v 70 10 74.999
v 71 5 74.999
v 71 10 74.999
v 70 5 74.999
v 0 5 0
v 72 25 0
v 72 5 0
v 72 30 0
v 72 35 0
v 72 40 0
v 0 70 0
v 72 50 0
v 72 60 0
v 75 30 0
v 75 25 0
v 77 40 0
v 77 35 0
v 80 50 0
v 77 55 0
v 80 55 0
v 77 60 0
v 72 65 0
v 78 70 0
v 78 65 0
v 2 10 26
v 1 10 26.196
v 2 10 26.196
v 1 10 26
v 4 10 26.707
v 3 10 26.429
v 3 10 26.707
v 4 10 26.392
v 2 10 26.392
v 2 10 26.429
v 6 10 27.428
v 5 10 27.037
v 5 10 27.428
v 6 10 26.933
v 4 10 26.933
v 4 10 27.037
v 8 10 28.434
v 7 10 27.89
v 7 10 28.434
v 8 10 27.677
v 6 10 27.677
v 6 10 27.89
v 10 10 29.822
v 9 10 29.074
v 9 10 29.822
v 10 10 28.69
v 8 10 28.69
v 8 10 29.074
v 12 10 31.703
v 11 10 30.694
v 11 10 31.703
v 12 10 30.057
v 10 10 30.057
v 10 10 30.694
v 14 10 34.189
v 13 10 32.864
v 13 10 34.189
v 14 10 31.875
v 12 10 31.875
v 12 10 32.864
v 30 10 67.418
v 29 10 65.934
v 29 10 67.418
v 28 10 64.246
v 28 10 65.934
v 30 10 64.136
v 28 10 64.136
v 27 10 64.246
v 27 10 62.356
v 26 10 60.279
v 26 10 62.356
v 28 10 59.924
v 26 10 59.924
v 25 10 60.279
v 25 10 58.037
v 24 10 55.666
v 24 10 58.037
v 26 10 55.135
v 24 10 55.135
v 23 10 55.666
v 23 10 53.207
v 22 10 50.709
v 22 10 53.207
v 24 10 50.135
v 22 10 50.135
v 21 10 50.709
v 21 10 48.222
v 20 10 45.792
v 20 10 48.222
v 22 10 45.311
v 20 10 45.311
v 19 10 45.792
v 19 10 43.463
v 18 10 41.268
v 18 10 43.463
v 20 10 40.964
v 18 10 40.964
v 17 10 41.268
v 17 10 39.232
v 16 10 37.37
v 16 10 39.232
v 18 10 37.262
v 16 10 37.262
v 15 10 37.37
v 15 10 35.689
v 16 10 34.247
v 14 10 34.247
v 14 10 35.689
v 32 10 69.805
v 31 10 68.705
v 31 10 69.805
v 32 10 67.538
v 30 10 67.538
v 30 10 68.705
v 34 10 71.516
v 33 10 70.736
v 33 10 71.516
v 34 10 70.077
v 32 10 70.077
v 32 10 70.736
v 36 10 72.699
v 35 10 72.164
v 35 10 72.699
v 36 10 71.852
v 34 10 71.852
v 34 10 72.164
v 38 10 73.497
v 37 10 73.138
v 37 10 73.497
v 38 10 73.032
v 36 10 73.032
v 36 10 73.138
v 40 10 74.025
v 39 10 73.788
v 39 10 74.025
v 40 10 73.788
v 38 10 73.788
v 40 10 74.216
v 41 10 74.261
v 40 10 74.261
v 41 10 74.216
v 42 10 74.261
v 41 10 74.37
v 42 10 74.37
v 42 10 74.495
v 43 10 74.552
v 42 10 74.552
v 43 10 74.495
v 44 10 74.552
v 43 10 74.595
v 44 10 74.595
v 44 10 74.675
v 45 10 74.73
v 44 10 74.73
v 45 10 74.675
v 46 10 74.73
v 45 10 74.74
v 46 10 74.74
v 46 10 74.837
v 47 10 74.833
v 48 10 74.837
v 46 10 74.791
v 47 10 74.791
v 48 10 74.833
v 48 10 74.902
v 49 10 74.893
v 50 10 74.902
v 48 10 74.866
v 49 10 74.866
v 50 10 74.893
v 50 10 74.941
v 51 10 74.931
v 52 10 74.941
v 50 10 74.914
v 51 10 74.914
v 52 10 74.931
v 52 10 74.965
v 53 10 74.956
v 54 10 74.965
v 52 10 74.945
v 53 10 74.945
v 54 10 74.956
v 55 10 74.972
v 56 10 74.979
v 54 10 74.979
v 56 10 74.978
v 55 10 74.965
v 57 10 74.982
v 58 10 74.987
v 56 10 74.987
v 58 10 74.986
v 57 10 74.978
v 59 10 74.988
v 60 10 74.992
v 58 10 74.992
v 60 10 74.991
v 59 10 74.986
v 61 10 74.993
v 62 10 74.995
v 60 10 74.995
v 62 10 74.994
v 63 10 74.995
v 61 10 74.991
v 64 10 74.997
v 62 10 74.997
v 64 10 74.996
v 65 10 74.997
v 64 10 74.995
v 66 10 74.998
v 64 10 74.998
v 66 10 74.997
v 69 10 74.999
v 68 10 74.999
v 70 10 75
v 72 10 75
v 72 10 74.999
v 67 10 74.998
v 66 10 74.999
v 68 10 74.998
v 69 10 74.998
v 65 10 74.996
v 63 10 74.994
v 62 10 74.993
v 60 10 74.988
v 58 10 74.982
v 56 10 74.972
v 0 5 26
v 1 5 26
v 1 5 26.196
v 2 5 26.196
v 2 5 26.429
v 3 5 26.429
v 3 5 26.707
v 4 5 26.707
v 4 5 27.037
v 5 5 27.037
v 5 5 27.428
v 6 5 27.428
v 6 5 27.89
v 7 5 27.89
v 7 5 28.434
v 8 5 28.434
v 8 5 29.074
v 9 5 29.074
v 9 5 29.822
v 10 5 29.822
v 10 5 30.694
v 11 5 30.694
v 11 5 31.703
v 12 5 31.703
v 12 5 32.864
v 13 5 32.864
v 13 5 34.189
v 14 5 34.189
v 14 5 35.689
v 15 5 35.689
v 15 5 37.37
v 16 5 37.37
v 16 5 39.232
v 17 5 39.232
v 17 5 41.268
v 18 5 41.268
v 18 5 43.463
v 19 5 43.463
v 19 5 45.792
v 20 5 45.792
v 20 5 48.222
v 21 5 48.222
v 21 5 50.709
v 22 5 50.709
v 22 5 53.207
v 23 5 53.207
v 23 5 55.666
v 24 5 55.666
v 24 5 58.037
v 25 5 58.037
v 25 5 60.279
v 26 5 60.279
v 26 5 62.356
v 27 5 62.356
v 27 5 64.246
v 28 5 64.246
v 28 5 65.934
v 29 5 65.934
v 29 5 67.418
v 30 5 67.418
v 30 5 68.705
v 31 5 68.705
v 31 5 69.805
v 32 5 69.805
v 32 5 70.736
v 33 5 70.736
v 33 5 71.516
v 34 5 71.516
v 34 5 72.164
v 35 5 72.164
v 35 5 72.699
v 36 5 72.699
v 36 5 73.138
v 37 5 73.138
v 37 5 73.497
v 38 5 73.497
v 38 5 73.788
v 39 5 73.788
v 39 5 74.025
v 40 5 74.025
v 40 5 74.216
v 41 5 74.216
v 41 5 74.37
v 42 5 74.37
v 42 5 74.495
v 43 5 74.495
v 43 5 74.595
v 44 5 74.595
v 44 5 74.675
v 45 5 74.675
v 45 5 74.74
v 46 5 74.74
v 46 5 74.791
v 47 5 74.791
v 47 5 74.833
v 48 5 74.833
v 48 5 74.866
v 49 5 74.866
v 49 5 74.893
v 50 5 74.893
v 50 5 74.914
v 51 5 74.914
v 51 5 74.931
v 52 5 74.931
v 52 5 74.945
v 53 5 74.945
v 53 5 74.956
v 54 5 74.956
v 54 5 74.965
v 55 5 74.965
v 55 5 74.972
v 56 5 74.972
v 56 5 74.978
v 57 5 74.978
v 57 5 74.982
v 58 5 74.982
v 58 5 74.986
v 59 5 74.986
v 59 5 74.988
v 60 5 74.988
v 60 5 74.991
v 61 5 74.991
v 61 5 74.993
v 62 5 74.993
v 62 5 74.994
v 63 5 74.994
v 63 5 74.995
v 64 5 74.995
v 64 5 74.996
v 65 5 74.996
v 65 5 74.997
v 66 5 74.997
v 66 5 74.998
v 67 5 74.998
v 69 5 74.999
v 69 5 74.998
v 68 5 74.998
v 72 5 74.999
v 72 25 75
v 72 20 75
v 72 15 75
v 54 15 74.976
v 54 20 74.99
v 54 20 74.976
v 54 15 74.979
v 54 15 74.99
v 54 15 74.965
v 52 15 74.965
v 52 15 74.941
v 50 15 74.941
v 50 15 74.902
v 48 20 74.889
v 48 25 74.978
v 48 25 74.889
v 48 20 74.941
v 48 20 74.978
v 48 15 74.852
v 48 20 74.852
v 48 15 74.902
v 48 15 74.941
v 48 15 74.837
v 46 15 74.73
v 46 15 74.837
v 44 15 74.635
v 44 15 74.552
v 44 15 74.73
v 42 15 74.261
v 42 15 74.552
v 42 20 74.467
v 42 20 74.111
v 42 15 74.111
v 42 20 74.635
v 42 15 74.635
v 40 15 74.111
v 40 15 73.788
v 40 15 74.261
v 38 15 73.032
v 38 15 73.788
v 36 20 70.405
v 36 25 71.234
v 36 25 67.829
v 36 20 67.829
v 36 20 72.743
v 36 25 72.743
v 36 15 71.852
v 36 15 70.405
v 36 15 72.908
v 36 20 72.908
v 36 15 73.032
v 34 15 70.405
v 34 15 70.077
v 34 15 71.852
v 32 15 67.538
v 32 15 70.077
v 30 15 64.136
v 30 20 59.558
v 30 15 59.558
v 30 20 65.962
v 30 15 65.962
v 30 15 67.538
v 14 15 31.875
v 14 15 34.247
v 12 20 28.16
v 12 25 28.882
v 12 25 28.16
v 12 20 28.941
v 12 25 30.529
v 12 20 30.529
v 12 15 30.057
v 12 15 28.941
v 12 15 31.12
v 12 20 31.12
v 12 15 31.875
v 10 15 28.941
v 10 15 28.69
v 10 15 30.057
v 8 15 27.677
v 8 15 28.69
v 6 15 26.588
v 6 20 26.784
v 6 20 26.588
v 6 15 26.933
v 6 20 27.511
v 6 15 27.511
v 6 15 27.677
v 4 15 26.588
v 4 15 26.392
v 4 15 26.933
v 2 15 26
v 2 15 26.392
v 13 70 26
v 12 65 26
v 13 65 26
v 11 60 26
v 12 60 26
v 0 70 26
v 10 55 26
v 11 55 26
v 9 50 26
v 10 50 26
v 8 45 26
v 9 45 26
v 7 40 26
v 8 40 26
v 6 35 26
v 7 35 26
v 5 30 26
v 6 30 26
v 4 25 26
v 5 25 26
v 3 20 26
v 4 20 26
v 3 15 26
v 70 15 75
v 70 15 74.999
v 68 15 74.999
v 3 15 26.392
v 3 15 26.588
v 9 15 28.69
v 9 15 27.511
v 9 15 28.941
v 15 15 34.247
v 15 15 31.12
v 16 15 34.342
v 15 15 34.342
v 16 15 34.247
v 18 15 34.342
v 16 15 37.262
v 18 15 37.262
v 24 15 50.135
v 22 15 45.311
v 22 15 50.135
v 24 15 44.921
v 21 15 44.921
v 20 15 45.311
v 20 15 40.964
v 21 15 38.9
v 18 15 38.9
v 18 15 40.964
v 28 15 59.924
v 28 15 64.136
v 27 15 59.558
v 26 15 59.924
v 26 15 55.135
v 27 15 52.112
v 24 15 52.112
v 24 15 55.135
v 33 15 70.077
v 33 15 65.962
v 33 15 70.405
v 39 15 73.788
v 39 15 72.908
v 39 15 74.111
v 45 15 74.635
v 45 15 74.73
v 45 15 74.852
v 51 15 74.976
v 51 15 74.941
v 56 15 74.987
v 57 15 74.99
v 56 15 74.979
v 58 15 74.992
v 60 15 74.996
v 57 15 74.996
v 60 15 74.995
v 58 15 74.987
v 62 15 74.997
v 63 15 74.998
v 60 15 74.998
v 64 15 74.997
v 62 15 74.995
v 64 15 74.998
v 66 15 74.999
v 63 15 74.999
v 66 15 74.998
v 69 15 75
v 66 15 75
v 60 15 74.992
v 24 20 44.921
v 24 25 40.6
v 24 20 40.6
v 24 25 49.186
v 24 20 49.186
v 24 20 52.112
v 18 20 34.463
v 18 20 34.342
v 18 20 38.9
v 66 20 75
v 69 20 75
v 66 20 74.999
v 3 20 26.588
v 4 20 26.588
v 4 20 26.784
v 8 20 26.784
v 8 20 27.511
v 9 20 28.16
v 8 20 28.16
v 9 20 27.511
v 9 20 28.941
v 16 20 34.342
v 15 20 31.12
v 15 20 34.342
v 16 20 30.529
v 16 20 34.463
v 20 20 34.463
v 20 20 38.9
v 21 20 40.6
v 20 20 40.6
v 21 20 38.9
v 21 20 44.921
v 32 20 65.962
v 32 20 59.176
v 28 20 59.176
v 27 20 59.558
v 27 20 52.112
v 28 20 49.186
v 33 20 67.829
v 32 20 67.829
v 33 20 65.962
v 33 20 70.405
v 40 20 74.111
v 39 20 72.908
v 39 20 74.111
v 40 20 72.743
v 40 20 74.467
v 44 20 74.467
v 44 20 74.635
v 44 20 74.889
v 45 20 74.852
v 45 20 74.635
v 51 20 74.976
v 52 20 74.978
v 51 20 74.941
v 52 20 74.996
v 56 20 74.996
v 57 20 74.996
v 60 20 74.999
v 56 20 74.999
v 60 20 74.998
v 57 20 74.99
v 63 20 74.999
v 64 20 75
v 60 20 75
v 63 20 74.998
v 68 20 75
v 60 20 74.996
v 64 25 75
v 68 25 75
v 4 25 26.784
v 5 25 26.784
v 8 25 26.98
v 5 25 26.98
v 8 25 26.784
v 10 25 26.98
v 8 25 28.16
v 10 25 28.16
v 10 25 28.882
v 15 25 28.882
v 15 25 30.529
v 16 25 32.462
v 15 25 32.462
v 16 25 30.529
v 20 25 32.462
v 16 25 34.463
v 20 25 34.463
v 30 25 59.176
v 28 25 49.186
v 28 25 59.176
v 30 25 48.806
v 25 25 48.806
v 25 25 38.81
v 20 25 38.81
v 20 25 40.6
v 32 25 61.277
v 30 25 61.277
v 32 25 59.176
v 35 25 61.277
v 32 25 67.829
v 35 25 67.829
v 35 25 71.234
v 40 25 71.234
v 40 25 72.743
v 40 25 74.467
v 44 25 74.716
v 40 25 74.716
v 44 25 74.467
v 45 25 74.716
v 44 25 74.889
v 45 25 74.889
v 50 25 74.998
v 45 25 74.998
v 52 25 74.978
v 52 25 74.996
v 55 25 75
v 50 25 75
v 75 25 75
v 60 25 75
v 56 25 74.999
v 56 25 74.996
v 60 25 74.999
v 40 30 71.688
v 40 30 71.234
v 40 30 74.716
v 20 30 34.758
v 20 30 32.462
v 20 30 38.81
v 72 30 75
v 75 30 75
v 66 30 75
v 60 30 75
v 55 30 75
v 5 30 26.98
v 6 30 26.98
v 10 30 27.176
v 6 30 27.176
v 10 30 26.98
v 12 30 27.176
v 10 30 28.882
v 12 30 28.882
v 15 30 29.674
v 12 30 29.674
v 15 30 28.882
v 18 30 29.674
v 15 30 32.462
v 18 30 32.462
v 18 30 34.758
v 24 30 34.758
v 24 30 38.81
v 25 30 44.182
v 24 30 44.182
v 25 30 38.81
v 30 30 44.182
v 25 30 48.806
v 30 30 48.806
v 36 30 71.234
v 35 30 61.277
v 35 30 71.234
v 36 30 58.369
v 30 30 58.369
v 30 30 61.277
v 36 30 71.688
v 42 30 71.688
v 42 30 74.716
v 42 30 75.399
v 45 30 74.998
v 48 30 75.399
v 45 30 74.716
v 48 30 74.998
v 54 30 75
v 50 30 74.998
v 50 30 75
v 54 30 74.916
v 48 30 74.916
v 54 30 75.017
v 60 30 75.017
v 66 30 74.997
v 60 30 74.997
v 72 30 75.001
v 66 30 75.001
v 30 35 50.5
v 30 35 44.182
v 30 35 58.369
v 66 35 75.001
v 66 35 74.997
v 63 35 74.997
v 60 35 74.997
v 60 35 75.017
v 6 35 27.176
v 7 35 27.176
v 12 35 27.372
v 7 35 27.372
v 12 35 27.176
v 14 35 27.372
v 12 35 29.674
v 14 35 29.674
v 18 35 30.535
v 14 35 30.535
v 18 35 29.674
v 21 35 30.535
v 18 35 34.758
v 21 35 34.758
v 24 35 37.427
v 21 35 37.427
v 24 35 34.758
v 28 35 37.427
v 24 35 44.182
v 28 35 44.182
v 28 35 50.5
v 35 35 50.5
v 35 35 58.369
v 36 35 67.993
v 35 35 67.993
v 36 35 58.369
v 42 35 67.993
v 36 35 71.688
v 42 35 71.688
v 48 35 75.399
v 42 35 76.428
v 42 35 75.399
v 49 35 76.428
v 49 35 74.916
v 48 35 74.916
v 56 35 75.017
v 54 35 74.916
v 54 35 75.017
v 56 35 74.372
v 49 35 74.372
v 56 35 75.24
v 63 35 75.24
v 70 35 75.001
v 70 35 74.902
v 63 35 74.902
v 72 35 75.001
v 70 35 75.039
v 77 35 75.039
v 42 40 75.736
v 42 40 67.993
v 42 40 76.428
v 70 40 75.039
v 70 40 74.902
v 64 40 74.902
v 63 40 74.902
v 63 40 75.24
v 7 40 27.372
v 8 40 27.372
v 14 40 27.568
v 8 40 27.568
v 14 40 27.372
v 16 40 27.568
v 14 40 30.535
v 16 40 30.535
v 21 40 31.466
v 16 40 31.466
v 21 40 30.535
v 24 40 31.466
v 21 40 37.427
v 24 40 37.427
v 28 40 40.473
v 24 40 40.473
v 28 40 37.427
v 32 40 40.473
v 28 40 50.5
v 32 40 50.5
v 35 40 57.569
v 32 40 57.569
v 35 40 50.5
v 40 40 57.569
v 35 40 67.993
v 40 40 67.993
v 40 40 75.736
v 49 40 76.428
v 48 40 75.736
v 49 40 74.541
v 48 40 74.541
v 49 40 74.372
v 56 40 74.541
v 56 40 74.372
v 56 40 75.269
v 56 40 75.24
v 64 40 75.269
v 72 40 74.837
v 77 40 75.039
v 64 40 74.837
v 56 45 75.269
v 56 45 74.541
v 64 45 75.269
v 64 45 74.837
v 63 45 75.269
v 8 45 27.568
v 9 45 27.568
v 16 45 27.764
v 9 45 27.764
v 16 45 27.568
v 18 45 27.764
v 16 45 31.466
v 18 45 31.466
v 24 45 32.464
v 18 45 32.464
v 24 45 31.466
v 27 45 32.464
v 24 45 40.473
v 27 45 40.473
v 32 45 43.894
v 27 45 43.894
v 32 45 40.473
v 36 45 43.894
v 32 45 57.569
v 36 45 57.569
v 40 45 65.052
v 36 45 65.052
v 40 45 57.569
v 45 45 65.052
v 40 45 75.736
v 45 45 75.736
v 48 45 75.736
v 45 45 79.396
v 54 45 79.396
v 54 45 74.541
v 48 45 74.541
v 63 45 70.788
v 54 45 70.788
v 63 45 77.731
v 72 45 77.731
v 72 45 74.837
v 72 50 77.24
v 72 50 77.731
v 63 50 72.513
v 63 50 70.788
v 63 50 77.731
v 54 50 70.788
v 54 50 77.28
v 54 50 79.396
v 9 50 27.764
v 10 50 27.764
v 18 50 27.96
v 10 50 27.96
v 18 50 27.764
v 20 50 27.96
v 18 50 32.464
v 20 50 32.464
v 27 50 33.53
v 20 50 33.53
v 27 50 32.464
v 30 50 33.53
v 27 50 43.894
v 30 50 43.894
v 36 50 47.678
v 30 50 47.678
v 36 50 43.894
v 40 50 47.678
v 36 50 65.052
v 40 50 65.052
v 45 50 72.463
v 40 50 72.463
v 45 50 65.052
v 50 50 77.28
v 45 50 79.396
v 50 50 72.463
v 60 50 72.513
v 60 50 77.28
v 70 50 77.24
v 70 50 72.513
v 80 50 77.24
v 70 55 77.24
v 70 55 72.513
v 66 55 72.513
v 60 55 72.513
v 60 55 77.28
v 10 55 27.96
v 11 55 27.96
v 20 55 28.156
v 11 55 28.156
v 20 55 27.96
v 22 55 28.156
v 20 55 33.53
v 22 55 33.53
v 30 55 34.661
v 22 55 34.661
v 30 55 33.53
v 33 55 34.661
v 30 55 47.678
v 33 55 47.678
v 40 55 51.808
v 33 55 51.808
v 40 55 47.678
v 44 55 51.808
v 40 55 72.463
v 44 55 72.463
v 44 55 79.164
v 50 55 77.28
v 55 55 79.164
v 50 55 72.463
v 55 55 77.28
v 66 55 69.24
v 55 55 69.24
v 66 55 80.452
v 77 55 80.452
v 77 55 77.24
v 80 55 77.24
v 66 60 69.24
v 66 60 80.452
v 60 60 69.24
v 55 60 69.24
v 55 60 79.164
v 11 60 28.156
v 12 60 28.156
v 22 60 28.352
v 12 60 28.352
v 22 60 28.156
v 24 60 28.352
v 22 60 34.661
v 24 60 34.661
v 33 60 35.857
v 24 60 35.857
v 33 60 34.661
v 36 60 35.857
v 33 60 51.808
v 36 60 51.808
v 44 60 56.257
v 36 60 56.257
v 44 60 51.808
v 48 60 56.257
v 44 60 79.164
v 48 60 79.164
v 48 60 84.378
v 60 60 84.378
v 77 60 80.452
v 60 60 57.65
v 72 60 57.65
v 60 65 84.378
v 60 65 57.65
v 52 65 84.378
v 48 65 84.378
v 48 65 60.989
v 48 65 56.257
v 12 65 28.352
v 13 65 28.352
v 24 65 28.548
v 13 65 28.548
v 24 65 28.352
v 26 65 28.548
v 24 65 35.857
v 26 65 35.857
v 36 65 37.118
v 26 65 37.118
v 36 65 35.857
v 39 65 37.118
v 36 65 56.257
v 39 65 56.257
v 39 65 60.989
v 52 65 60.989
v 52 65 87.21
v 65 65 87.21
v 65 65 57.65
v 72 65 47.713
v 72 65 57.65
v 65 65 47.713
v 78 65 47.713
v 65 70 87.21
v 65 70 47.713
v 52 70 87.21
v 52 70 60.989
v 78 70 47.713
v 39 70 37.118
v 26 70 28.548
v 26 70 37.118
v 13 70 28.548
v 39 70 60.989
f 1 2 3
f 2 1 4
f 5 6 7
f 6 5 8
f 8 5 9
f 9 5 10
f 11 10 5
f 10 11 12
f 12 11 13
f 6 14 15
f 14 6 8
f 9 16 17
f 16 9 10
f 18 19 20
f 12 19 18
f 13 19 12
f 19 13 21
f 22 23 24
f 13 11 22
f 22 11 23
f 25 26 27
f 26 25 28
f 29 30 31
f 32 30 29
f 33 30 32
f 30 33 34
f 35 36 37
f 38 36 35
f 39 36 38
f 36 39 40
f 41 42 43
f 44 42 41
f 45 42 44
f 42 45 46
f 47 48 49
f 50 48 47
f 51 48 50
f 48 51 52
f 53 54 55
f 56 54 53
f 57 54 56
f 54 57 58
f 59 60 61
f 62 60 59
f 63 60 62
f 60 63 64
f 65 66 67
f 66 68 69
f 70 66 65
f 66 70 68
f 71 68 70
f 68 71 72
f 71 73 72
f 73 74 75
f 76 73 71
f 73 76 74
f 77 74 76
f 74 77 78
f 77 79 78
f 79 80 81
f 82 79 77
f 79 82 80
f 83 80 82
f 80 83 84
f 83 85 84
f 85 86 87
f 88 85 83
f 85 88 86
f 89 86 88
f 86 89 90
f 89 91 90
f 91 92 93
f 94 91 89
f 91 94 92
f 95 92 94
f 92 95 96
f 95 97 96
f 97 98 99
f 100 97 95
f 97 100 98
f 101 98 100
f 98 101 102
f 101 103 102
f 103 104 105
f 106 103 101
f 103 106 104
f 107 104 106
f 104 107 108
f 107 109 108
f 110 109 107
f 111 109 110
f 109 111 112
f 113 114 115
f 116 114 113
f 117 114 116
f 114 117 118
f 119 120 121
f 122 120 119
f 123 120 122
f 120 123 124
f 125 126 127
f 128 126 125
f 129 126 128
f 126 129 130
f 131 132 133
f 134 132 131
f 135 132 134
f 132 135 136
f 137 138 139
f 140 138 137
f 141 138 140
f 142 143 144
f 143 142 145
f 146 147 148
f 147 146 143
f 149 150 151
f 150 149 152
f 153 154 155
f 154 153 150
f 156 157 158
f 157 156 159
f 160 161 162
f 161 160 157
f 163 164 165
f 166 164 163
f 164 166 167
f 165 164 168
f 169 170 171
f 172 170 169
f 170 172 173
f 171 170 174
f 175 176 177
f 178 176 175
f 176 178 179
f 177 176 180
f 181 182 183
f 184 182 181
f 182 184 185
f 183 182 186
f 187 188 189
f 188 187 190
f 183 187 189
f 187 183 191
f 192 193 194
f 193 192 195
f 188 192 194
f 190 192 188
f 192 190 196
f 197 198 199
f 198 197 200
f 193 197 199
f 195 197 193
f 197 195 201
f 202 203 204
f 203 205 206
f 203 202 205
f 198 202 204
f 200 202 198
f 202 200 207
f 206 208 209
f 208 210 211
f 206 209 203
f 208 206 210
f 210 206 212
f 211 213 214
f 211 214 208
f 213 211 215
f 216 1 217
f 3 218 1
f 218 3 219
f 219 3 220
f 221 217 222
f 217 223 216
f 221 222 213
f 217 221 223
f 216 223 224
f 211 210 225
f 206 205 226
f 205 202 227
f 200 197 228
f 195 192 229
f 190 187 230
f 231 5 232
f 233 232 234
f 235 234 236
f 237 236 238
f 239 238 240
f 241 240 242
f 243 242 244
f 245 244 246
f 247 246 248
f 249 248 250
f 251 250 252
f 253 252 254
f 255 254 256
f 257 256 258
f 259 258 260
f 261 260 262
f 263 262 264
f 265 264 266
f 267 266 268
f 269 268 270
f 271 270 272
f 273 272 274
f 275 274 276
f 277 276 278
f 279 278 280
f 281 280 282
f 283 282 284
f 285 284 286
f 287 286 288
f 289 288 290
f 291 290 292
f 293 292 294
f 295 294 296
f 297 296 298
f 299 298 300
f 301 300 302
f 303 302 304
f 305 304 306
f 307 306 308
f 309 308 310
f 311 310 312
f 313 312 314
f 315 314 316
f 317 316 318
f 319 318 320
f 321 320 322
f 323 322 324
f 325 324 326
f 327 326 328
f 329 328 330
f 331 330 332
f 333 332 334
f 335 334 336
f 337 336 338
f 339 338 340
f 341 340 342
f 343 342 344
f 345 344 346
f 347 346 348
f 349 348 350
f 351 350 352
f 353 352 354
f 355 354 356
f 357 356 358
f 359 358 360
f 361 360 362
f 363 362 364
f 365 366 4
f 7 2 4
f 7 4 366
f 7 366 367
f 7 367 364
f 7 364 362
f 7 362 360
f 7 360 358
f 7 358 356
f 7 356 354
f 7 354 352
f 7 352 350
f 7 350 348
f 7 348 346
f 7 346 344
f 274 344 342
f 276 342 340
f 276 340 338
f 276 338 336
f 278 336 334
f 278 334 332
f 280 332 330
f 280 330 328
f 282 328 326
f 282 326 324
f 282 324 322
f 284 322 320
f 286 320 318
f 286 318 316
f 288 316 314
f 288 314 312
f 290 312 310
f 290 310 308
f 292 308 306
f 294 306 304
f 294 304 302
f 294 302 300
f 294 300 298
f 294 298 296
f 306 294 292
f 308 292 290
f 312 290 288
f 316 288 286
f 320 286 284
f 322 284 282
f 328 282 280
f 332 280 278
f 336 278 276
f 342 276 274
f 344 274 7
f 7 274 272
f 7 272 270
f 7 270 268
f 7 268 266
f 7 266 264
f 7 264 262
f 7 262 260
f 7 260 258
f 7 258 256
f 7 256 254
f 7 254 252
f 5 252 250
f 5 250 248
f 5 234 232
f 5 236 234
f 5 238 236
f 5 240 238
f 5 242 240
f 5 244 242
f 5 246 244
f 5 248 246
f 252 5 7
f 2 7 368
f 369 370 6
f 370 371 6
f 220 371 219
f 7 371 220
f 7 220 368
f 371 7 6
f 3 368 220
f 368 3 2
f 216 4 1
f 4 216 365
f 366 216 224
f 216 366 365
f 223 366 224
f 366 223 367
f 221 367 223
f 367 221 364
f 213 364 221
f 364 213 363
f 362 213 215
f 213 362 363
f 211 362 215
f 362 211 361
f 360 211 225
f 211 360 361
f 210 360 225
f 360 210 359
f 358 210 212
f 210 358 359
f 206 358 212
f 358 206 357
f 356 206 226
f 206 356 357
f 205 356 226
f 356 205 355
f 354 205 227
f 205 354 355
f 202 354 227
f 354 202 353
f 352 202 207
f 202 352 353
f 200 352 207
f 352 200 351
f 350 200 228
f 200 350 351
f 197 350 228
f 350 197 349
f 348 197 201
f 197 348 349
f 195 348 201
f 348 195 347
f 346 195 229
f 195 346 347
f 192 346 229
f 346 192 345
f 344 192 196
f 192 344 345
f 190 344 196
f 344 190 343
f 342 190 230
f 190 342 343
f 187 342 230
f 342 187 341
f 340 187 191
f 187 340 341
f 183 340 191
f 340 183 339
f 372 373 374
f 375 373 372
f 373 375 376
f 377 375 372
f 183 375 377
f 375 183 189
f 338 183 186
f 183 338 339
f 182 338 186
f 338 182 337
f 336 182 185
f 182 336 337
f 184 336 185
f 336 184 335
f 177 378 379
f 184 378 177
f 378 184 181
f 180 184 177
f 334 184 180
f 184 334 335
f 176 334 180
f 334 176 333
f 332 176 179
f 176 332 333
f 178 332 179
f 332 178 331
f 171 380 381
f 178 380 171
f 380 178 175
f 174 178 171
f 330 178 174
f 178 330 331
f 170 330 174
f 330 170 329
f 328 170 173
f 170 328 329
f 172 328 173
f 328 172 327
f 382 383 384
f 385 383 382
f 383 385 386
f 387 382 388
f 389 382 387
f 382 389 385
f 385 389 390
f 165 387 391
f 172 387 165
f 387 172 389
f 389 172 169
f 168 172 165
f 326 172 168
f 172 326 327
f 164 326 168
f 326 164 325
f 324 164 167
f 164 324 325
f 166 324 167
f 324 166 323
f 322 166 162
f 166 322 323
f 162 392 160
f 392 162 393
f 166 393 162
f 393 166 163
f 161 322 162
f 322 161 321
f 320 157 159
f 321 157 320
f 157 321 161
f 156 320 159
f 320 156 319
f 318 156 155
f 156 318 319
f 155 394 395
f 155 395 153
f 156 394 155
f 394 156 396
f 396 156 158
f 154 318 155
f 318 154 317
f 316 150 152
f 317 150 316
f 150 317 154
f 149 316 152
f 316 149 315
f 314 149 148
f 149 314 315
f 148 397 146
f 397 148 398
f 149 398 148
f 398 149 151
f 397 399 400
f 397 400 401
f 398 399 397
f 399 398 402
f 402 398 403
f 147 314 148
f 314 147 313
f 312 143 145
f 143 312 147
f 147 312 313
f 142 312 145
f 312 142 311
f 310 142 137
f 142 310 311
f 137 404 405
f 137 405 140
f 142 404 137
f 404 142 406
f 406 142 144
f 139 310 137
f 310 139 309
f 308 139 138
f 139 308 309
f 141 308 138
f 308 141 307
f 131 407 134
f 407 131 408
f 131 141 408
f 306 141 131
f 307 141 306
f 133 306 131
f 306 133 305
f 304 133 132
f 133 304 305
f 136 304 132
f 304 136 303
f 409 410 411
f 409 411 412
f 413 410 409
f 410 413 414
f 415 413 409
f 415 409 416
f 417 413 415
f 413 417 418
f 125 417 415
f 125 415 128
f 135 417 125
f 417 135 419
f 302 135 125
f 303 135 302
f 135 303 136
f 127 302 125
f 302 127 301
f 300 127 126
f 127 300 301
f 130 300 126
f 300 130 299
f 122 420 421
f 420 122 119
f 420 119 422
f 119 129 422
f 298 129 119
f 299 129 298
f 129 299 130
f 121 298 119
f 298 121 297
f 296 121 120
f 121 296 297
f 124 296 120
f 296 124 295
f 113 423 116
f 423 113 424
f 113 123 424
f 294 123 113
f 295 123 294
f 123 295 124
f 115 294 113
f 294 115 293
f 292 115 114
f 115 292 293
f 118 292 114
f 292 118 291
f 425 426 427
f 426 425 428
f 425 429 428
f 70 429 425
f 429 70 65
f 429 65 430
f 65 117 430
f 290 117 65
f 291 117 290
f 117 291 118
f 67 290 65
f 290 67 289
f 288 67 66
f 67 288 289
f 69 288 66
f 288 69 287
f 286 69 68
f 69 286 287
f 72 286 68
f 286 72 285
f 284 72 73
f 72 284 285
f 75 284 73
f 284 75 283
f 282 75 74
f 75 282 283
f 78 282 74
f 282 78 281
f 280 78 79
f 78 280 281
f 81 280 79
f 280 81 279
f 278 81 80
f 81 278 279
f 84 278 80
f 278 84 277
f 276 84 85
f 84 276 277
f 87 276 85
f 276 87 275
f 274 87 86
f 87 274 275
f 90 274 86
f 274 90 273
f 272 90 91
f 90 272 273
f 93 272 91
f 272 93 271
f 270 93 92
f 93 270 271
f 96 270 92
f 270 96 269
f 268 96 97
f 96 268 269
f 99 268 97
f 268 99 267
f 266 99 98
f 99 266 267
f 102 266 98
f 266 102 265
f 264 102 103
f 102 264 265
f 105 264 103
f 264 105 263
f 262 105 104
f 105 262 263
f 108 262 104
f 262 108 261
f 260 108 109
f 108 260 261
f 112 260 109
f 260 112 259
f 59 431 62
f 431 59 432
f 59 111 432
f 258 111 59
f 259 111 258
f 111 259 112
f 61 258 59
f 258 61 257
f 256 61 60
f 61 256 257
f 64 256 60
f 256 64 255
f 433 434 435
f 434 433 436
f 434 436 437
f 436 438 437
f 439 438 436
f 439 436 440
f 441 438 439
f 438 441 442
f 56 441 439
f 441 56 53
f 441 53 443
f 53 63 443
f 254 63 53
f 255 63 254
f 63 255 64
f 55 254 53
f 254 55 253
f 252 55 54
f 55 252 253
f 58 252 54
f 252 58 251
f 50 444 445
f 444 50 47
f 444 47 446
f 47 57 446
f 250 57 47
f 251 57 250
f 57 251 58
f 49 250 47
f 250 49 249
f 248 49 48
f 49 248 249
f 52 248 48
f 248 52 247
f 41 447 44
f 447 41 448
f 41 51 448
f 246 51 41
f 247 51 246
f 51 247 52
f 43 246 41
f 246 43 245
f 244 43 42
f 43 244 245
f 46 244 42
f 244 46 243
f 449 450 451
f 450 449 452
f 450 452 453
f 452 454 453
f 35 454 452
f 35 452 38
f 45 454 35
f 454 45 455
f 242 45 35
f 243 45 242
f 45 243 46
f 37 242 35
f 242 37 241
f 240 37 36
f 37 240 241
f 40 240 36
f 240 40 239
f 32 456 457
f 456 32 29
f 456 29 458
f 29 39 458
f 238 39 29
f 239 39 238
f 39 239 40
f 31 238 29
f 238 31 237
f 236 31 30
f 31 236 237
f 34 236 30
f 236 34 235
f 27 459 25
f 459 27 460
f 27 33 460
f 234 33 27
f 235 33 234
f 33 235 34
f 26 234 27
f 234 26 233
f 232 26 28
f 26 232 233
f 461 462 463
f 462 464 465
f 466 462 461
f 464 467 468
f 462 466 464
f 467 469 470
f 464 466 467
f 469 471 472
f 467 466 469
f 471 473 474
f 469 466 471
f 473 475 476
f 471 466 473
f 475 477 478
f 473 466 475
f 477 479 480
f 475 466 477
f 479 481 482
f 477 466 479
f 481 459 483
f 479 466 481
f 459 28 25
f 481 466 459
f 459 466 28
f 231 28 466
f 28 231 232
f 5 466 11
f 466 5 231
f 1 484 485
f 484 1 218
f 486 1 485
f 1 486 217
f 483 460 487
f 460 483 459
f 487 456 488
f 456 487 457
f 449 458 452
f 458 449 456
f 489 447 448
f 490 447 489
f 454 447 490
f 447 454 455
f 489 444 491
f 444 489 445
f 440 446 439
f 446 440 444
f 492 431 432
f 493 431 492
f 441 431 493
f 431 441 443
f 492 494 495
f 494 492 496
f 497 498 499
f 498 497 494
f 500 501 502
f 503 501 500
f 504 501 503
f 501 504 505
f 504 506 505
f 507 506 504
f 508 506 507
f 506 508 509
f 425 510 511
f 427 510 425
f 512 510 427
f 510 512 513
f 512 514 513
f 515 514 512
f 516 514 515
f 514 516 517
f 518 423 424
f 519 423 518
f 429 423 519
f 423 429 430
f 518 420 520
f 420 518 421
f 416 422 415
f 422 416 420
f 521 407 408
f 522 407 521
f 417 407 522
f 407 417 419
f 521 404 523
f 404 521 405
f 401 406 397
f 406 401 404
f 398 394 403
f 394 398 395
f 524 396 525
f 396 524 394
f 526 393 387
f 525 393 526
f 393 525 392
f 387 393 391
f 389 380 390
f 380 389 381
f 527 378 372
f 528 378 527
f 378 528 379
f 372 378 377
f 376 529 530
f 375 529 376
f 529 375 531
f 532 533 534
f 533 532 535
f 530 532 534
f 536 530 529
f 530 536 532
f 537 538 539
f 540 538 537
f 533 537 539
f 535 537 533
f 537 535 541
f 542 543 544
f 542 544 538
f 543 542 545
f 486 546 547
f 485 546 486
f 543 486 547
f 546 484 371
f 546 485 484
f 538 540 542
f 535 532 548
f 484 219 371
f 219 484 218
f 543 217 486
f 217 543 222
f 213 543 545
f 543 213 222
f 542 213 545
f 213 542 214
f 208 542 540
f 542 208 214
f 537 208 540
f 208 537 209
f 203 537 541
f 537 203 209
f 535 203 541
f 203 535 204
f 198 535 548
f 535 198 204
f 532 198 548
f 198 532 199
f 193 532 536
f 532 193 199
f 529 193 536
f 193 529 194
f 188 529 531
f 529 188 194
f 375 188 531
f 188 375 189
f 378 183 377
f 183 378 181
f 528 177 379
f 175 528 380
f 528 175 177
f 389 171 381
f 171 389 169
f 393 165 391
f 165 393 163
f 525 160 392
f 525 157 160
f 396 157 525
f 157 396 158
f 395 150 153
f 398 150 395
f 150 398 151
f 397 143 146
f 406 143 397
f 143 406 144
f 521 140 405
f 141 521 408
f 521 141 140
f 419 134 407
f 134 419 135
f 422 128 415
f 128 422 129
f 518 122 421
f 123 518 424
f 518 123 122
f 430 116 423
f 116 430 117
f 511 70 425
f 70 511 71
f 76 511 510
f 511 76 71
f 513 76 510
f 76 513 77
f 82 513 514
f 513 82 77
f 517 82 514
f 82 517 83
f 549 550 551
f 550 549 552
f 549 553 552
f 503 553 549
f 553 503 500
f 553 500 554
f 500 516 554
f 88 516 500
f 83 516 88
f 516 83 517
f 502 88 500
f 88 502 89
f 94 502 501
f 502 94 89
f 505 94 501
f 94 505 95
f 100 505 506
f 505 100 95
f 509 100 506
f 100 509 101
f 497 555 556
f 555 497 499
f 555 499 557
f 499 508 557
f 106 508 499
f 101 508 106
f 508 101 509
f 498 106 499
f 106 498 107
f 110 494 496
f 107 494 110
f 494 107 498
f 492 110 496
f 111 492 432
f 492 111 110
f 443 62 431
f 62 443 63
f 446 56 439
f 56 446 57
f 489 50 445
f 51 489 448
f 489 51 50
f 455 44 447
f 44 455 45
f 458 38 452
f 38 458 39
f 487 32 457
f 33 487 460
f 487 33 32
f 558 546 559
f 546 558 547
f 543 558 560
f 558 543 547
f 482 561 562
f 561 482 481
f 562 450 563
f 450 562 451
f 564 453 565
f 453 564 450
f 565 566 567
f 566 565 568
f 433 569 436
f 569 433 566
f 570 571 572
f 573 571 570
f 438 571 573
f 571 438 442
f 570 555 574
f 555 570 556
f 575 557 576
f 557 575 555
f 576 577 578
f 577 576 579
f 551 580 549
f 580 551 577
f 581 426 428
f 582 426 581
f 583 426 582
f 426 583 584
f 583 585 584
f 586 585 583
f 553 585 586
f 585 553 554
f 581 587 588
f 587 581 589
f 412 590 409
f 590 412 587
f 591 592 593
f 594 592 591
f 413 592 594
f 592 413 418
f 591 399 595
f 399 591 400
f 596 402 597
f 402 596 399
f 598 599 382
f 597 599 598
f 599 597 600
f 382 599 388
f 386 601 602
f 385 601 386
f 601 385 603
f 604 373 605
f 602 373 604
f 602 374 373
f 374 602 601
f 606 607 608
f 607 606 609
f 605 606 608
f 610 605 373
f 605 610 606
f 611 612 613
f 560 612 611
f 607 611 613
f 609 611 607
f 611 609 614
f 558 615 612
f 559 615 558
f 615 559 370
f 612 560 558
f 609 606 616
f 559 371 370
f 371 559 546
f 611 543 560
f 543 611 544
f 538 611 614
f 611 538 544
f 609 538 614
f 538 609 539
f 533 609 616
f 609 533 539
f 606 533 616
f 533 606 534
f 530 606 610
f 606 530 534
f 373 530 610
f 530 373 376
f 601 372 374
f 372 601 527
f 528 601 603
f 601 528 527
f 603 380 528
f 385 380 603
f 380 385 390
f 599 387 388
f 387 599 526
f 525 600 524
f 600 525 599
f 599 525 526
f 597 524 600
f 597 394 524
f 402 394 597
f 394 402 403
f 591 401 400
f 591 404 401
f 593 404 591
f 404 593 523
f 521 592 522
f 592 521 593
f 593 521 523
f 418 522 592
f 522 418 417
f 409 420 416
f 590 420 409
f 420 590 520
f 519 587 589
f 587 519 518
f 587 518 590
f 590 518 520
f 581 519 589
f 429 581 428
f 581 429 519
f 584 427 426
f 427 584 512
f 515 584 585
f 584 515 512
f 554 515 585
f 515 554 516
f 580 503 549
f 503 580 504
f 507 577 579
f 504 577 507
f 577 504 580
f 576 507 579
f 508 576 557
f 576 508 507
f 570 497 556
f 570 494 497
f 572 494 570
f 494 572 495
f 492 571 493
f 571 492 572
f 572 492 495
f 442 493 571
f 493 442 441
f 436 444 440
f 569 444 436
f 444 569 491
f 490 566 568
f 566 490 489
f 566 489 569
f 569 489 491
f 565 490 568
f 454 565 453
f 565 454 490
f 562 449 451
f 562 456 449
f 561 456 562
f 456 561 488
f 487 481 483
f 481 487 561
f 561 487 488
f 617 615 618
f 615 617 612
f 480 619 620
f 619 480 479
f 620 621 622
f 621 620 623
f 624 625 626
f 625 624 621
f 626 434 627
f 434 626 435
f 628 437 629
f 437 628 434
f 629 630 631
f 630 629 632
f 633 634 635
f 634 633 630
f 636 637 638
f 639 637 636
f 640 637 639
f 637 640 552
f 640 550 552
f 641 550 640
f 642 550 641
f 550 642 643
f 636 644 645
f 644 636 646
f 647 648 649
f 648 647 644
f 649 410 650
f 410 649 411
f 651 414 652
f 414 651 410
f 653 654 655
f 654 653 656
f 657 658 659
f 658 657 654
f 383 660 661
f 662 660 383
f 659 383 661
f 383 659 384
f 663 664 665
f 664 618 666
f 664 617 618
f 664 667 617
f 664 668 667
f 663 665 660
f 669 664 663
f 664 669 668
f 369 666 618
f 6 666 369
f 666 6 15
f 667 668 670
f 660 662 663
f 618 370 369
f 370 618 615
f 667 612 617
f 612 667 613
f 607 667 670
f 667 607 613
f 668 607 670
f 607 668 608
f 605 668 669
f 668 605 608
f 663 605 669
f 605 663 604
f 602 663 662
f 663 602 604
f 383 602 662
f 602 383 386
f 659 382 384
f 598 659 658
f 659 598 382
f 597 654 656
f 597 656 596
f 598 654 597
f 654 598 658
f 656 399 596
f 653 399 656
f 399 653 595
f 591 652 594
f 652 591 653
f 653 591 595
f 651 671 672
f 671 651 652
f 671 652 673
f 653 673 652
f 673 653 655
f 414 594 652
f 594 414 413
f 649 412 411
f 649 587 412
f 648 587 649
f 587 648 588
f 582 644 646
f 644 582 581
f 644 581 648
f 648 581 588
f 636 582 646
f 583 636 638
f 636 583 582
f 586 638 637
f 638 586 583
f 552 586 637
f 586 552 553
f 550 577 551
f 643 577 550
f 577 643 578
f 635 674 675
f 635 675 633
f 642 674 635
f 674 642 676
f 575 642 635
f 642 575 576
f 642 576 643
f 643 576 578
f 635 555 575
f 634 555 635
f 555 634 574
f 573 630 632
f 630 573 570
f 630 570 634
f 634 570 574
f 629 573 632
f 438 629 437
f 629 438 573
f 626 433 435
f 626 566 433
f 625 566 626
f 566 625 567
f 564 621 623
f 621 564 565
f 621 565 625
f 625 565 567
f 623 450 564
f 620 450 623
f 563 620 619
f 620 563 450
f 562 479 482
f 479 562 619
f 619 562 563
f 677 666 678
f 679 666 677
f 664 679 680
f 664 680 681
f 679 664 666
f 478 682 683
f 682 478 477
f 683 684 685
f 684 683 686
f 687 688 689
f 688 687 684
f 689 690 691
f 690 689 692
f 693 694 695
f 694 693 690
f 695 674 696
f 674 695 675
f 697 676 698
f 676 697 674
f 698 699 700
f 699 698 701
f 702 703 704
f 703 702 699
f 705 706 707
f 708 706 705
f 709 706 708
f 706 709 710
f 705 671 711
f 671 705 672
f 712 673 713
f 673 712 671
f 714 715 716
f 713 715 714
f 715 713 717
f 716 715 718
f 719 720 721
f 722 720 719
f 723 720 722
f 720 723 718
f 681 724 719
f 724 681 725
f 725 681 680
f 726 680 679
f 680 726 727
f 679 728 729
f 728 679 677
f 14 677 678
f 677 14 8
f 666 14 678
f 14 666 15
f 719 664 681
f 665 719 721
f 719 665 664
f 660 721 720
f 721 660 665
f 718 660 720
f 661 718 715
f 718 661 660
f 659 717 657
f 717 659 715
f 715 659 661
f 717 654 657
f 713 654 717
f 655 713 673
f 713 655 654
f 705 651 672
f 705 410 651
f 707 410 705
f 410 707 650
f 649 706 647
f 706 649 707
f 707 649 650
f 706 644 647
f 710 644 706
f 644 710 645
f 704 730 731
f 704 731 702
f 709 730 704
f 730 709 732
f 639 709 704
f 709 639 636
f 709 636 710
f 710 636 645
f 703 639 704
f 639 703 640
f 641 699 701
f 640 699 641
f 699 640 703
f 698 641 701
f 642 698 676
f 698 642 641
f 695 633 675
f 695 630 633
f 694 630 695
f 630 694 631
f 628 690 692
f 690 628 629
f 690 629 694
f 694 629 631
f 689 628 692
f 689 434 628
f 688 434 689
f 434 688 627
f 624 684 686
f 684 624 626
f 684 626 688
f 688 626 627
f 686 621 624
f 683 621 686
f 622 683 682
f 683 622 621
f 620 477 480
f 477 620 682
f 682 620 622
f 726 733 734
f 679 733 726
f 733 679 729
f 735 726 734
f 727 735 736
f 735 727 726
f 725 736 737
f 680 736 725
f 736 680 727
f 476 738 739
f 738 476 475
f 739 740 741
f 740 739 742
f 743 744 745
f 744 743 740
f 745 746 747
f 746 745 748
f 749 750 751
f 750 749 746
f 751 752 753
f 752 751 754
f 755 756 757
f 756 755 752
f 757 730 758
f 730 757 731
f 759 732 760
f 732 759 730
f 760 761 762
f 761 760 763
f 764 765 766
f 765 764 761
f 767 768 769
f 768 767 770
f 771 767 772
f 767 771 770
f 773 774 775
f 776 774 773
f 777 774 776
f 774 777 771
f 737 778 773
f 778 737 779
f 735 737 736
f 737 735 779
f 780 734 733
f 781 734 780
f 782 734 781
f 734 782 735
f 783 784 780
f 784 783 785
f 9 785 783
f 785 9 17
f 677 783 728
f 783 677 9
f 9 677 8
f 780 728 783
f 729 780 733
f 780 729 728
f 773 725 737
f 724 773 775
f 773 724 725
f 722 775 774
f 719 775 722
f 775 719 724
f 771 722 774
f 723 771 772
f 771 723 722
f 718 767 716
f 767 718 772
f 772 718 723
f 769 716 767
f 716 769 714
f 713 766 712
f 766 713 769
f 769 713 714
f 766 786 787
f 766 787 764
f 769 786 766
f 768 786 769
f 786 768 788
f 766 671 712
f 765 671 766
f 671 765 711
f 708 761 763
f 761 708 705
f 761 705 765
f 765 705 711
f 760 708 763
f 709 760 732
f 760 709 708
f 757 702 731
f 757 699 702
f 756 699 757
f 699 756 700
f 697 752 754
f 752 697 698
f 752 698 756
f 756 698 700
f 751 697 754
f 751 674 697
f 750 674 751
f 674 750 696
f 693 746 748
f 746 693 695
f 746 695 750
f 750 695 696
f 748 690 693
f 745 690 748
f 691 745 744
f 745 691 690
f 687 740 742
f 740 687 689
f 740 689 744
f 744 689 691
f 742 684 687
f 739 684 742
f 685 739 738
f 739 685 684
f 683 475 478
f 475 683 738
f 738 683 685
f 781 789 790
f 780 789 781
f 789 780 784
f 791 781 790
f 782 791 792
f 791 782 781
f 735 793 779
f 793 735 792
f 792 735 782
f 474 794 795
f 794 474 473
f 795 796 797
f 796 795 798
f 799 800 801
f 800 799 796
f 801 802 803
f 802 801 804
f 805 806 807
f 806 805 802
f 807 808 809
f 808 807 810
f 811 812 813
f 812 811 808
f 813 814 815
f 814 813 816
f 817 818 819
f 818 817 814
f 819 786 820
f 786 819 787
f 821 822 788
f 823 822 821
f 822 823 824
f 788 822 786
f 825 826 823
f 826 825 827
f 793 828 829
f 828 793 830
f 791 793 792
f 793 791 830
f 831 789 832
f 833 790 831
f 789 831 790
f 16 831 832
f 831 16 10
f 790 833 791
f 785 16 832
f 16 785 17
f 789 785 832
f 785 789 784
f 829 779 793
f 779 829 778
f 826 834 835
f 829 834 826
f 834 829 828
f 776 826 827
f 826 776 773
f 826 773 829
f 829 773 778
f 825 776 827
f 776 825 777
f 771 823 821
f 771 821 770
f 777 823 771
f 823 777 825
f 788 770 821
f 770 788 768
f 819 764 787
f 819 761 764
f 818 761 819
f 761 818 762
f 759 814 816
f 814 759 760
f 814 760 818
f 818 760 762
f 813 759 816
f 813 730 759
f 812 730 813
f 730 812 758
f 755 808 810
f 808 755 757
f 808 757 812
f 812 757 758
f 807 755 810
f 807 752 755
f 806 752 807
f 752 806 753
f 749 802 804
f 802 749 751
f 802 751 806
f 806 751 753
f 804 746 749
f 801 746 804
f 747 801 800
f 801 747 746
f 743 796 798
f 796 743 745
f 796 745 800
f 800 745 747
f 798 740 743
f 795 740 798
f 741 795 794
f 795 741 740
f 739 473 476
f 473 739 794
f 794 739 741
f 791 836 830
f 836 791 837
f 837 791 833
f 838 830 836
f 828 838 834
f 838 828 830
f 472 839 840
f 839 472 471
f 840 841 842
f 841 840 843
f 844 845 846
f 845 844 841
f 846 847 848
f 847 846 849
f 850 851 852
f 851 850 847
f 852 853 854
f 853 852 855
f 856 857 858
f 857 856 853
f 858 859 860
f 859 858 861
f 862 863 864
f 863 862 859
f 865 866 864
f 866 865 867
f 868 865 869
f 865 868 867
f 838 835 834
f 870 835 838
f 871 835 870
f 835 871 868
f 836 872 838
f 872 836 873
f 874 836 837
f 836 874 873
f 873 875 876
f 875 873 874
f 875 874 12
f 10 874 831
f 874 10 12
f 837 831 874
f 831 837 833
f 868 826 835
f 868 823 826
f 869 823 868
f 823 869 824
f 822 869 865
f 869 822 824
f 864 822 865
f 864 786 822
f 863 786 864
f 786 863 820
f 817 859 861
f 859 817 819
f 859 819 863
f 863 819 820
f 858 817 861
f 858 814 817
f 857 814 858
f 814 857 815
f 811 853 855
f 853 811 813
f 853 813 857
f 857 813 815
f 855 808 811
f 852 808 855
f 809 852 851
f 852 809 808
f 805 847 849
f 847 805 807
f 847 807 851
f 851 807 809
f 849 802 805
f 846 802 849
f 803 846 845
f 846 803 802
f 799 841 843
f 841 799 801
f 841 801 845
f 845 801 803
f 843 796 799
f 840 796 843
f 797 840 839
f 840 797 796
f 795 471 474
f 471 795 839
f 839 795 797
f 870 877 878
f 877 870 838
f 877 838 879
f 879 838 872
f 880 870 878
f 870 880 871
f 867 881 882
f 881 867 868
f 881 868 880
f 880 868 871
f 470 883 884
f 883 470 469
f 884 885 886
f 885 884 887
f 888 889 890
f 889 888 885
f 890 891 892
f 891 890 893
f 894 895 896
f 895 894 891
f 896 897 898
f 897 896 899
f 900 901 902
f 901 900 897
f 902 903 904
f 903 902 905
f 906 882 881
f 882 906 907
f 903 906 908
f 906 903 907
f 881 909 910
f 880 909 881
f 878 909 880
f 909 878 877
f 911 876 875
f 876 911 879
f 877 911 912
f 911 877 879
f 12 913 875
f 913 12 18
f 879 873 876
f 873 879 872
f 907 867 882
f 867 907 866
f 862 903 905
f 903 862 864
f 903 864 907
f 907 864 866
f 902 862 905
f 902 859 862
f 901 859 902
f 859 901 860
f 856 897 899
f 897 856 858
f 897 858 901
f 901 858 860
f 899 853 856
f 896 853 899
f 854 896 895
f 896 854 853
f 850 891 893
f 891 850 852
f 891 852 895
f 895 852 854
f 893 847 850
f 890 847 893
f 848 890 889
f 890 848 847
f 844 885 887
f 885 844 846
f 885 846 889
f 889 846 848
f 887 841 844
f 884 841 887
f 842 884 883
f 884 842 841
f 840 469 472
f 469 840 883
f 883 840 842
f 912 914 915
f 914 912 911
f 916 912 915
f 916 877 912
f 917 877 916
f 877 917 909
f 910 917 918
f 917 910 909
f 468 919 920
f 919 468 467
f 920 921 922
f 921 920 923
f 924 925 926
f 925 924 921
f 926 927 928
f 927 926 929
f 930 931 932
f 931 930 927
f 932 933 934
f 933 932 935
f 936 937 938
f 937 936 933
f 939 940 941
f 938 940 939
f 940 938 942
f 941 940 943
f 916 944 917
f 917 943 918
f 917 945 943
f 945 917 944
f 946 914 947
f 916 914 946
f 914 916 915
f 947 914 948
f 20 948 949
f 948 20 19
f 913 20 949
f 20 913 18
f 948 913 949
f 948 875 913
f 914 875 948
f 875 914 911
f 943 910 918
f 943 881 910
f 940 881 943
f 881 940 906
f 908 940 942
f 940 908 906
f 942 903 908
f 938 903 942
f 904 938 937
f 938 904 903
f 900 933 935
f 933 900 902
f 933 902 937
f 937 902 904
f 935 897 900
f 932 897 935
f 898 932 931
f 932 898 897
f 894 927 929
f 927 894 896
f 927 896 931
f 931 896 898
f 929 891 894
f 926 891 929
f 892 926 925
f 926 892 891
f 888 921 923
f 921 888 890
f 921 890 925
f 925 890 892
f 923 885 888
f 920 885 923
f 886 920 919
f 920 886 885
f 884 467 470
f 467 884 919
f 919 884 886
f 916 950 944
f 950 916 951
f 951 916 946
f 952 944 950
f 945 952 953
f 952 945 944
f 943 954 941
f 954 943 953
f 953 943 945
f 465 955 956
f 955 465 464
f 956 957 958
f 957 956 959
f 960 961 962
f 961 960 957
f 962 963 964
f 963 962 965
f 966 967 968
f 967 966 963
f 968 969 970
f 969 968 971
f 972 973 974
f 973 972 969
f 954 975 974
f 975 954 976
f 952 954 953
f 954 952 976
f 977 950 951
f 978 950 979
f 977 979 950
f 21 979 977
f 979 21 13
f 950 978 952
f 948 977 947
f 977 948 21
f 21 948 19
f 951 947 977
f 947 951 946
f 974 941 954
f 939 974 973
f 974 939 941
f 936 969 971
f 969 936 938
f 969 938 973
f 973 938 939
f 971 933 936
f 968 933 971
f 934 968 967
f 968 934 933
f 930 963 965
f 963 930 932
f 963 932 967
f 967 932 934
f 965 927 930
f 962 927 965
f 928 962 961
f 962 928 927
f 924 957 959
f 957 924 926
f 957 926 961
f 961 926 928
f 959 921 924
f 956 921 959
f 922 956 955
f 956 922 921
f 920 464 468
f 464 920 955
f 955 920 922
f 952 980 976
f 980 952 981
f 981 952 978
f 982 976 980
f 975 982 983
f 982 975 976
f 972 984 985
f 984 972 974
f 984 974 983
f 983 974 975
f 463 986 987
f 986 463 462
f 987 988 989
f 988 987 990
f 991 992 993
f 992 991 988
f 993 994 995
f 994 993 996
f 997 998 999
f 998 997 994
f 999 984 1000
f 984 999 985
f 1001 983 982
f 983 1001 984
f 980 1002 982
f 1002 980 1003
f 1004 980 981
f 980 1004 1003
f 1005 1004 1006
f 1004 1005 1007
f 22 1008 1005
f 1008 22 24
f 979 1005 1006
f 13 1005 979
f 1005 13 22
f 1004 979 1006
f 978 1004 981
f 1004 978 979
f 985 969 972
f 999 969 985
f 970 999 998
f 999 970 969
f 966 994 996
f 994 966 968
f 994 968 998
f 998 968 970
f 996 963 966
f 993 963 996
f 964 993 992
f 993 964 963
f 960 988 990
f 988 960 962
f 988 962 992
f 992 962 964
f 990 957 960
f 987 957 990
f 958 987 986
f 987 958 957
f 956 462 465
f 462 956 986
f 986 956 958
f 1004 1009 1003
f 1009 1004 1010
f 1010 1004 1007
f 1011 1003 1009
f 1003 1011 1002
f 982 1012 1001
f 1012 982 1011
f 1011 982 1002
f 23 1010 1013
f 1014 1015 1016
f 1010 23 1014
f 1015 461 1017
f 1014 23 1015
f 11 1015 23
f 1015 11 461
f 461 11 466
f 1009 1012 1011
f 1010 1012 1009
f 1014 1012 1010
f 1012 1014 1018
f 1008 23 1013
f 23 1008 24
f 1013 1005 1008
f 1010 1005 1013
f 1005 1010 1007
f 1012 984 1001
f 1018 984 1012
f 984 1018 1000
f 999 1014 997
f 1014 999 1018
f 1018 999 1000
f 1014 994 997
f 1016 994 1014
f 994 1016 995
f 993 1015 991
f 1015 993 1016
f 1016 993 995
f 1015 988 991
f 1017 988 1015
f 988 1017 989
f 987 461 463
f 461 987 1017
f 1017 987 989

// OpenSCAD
// Solves the logistic equation  
// Rich Cameron, adapted Joan Horvath, December 2019 

a = 0.2; //exponential decay factor 
w = 5; //width in y direction of each iteration
offset = 25; // height in millimeters for f(x,step) = 0
K = 50; //carrying capacity 
 
// h = step in x direction - varied as a parameter
// f(x) is assumed to be the logistics function 
// And assumed to start at f(0) = 1. 

for(i = [1:13]) translate([0, i * w, 0]) f(h = i);

module f(i = 0,  h, start = 1, end= 2*3*4*3) {
	cube([h, w, start + offset]);
	if (i < (end - h) )
        translate([h, 0, 0]) 
       f( i + h, h, start *(1 + h*a) - h * a * start*start / K, end);
}
